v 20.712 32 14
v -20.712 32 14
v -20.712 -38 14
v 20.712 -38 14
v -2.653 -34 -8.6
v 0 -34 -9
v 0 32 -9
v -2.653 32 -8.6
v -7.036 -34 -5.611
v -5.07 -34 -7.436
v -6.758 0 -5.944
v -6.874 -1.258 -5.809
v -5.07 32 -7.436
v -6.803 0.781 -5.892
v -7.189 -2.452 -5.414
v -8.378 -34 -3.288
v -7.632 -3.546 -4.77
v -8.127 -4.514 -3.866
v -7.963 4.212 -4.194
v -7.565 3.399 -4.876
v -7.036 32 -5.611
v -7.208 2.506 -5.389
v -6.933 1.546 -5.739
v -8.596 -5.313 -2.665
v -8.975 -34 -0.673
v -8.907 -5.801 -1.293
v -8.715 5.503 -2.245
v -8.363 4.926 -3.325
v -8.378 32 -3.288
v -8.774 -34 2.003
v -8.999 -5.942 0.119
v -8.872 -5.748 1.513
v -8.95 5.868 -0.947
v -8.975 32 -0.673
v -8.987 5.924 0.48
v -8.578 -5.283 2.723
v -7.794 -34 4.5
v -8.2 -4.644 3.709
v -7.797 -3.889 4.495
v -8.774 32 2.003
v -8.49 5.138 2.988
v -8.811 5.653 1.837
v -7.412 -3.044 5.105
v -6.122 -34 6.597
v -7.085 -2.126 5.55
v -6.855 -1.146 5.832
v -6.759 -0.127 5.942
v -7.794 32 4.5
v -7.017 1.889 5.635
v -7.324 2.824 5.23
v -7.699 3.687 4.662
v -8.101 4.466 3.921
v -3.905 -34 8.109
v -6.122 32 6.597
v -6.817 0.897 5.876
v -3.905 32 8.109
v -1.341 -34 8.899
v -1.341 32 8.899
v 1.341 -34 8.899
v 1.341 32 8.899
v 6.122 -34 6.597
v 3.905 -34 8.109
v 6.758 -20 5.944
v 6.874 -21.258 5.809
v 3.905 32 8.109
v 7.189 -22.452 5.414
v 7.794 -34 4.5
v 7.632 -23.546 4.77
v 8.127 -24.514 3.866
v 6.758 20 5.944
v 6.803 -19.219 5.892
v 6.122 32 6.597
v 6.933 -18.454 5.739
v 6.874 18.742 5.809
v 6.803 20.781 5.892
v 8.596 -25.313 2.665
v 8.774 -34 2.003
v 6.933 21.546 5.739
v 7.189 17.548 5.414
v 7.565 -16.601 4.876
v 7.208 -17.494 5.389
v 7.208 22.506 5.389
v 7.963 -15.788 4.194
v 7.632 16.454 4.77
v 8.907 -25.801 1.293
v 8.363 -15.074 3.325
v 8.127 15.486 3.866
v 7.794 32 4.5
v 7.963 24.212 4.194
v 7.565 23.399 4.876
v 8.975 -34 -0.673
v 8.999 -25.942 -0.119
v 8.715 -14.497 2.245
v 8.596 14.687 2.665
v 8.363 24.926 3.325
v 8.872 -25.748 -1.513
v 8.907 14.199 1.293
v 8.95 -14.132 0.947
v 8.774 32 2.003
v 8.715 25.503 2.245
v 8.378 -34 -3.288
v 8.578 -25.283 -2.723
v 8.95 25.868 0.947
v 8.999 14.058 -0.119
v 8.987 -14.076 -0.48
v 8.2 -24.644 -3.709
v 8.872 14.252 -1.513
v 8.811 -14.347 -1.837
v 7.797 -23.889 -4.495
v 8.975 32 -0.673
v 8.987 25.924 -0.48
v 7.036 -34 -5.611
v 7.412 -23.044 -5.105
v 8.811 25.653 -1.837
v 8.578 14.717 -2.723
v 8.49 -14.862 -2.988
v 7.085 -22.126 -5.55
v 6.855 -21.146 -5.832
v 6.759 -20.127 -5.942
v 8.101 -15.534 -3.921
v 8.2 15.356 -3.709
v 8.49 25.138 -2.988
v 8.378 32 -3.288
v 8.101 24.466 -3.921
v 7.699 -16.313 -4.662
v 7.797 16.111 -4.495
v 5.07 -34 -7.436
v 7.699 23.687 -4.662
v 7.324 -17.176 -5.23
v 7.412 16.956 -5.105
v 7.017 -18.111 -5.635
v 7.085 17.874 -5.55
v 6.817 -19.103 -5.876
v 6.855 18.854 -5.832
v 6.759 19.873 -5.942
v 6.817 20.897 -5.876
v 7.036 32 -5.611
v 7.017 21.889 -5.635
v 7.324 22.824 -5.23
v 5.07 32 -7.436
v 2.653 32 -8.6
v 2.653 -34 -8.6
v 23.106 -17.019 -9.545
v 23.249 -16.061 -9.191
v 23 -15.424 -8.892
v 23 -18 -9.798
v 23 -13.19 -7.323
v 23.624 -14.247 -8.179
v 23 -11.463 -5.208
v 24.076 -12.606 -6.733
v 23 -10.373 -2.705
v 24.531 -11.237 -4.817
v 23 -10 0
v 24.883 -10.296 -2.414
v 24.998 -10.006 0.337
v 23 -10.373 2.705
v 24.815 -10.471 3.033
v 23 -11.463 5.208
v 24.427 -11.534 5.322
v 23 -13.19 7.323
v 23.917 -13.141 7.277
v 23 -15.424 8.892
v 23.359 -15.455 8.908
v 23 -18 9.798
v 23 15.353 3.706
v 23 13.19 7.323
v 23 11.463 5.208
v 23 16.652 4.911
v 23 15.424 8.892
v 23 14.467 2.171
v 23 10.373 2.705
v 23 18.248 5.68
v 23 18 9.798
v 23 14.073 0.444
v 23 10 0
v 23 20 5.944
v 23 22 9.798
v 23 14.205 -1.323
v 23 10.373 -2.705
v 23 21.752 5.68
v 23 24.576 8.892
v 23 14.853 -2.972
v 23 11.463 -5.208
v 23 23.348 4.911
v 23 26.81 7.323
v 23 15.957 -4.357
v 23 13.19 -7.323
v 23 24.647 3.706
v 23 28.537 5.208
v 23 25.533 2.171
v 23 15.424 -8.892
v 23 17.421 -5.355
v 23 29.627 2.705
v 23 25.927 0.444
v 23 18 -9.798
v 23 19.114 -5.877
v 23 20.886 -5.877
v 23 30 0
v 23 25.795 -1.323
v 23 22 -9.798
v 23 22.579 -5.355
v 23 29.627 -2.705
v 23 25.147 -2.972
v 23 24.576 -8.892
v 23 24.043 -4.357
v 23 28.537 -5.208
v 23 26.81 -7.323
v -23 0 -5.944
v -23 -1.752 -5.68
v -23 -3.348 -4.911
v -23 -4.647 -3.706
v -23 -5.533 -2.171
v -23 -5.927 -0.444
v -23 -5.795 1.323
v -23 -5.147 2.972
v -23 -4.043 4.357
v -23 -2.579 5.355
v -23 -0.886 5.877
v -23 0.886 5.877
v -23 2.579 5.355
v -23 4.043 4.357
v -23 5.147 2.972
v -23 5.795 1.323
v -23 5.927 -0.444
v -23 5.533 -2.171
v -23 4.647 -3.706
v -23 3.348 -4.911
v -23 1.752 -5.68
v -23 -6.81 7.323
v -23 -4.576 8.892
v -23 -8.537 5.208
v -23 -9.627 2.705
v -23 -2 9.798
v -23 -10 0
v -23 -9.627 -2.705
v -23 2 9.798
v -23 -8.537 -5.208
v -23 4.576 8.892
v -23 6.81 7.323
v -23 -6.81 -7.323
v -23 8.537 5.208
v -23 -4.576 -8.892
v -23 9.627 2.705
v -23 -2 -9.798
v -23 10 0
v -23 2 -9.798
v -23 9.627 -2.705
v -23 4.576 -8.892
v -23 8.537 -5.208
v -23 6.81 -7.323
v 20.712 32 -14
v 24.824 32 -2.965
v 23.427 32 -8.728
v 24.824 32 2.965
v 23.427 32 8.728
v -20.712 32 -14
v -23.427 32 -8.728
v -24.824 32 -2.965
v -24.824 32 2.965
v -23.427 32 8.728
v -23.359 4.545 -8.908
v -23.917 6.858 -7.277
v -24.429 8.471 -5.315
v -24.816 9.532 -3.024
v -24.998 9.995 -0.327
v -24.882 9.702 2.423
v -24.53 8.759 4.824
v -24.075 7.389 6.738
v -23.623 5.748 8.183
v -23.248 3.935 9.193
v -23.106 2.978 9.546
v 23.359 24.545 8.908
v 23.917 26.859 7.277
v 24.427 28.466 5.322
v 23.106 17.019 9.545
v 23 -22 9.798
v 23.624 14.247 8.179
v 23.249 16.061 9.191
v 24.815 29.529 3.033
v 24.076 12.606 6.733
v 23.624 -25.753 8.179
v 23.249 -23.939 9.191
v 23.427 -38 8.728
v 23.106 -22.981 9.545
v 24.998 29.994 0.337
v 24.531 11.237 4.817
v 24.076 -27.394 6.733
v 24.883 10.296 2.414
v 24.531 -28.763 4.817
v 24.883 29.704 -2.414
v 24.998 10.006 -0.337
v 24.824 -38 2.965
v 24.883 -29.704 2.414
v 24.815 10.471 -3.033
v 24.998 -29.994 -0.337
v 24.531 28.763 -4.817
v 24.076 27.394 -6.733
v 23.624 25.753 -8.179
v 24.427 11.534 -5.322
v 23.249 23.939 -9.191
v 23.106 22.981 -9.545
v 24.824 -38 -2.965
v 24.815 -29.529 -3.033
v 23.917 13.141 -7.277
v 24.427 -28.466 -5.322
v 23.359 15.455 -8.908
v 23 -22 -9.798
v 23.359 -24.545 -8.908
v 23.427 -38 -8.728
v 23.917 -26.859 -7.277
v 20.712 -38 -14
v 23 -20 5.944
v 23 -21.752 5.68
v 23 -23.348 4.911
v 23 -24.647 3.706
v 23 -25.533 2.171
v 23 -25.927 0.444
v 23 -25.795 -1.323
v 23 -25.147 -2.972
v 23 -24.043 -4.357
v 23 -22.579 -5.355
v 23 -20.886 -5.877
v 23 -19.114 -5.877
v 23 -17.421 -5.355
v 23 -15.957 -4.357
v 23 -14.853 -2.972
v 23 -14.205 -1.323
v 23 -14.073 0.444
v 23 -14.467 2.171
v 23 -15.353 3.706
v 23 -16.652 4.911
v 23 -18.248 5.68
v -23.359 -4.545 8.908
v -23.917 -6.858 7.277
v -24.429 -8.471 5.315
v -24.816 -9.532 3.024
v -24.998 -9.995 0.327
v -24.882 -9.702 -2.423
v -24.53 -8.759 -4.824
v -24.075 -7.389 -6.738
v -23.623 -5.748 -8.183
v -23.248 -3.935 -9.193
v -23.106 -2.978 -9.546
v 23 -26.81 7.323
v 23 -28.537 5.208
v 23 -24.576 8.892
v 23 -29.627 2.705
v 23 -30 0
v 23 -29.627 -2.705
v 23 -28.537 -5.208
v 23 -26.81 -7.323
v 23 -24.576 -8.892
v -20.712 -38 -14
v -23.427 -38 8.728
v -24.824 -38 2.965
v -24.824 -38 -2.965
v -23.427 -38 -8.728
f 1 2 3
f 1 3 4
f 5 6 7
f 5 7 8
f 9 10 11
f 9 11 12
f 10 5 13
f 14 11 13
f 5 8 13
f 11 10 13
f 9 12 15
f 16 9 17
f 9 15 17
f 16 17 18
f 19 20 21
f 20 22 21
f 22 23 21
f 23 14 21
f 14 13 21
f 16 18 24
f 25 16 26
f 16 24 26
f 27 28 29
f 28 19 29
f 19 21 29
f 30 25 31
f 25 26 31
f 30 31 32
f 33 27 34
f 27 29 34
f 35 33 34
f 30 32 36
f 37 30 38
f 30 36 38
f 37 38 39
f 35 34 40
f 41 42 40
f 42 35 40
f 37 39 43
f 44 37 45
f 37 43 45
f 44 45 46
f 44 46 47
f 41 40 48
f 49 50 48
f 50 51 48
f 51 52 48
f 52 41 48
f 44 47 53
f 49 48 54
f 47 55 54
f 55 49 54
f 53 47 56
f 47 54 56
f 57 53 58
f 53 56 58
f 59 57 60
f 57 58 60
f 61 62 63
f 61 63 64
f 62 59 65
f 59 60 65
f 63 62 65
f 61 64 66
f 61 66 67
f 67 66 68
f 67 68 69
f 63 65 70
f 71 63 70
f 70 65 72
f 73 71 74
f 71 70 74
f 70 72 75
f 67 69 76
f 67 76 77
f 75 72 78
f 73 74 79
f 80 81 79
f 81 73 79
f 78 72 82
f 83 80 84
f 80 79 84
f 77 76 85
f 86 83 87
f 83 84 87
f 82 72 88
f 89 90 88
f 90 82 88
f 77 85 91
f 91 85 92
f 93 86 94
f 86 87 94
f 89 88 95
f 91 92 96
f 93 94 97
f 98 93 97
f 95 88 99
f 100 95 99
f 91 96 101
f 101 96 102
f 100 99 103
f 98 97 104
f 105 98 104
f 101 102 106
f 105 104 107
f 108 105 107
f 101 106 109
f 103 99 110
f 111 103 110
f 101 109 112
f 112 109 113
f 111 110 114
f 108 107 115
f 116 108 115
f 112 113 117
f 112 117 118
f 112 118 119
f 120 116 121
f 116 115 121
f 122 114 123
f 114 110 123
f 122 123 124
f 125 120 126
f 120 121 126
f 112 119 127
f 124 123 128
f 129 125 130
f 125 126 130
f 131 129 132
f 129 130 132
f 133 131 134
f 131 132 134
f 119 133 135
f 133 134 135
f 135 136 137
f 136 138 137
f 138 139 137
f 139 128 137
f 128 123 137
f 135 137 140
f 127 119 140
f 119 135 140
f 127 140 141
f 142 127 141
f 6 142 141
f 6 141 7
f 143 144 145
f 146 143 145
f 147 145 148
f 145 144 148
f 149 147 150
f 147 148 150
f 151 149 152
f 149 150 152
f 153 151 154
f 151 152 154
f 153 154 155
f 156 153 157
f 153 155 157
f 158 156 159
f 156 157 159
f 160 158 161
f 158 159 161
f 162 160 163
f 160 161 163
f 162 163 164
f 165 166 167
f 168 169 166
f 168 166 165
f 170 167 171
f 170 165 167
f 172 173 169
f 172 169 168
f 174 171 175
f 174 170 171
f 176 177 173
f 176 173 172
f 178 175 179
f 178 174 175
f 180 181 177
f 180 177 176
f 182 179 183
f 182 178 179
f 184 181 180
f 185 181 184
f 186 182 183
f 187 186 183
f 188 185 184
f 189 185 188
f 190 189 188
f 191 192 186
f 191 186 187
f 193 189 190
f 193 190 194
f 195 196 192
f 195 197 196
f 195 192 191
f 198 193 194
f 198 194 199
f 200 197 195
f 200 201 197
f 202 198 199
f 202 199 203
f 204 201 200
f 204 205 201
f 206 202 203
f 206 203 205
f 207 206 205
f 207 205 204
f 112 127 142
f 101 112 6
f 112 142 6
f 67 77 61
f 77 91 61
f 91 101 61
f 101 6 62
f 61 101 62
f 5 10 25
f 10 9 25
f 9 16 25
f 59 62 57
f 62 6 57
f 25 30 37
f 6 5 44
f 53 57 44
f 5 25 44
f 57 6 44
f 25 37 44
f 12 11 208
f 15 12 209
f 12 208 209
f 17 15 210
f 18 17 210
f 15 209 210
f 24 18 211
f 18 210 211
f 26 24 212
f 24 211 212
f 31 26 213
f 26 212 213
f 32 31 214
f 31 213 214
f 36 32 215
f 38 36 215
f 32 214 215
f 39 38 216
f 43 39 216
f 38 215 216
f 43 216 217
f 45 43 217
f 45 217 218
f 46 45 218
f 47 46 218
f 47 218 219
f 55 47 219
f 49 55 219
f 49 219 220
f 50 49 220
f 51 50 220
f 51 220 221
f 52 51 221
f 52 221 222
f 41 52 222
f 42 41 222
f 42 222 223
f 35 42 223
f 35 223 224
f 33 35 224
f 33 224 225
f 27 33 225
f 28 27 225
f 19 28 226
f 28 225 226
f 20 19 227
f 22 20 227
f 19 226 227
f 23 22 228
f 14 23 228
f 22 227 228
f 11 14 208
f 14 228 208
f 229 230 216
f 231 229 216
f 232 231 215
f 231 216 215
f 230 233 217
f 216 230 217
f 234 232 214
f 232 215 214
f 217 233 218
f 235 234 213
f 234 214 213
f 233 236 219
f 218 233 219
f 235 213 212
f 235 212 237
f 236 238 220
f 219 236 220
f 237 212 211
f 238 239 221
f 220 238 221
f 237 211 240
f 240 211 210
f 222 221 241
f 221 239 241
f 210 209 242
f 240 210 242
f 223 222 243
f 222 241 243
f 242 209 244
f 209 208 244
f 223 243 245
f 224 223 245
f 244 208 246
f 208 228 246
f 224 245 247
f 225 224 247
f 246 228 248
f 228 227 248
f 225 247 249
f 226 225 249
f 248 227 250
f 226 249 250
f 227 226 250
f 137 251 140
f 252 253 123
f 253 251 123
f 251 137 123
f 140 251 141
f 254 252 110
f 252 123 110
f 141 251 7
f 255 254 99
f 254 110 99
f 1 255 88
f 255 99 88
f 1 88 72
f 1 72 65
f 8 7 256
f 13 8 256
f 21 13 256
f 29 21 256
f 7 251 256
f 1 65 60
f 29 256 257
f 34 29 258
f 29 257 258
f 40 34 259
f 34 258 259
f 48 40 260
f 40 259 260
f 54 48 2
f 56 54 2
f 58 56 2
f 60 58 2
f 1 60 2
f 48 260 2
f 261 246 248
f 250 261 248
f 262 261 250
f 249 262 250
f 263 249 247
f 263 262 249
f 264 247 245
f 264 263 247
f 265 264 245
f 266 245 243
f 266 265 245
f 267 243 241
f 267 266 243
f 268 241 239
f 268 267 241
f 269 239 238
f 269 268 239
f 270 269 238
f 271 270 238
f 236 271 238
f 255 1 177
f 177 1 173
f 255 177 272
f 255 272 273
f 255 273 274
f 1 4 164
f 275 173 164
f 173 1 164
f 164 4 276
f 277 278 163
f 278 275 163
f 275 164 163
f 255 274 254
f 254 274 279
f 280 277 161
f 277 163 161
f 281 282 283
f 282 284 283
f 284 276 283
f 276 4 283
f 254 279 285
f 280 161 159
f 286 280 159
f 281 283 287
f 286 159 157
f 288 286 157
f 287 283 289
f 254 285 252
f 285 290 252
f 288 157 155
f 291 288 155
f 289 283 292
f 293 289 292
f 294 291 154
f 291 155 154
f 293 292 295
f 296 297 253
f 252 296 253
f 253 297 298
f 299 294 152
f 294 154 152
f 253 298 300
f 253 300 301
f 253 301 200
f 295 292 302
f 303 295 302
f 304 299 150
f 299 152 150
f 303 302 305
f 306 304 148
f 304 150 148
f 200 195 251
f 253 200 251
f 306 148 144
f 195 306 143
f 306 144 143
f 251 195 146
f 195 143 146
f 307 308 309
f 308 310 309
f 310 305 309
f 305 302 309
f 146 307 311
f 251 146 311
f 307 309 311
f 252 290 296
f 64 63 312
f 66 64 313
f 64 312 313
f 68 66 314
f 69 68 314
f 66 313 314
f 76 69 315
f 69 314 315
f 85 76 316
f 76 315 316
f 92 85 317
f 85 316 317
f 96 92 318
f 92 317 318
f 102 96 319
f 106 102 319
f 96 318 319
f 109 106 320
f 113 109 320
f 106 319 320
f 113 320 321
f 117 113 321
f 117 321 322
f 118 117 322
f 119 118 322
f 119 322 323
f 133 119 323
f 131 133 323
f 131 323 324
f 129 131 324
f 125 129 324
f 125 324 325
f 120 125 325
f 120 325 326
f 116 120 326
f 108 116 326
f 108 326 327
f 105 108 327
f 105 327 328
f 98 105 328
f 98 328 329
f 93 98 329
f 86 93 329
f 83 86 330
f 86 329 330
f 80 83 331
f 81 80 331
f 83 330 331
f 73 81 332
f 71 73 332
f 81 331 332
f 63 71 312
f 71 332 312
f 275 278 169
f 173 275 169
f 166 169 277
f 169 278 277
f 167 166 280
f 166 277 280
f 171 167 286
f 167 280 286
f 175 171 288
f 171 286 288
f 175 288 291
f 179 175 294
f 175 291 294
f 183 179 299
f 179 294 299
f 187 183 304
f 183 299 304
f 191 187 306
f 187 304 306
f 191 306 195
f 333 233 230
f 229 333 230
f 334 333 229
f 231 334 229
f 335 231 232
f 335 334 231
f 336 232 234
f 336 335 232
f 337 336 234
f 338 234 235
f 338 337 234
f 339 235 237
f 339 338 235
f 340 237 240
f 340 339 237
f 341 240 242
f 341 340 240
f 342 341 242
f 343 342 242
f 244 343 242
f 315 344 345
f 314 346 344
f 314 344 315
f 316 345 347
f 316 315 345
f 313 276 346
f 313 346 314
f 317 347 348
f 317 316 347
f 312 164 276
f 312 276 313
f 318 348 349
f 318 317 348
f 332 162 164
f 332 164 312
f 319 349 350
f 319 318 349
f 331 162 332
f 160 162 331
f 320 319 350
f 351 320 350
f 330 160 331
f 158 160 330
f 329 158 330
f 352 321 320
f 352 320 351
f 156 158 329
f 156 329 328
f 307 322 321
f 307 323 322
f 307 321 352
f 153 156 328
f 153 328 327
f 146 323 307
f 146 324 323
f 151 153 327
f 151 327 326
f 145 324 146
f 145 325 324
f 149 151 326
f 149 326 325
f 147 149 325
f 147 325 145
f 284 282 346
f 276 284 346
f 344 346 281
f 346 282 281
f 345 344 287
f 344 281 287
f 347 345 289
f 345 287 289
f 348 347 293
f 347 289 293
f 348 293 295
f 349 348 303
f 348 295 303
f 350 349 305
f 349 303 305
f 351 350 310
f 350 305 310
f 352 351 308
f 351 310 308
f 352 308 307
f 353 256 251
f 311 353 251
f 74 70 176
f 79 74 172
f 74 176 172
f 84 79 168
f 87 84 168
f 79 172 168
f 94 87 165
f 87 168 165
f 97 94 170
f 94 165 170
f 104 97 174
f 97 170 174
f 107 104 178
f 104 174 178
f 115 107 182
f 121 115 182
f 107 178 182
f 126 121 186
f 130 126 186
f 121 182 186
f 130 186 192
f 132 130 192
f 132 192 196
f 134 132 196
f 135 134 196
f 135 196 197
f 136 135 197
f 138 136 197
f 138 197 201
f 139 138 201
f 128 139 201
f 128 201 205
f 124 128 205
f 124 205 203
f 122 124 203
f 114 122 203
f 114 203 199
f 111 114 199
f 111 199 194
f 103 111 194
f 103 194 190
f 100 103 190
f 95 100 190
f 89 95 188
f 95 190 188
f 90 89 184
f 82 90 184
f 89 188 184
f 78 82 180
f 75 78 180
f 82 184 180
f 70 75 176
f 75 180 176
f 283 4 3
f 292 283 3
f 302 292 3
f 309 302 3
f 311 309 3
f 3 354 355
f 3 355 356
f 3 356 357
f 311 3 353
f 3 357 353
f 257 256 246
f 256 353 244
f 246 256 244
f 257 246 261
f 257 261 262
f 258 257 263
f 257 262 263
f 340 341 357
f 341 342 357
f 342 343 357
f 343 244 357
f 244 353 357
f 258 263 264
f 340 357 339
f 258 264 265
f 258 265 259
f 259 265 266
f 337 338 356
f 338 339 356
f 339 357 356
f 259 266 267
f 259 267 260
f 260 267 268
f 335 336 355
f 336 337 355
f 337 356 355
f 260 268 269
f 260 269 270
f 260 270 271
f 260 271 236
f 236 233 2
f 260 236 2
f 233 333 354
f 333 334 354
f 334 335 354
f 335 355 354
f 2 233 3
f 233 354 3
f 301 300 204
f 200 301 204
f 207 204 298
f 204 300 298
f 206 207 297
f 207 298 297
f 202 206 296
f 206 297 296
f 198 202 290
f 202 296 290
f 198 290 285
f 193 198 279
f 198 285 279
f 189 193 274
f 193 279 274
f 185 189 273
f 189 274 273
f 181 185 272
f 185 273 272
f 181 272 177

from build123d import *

# Parameters (mm, degrees)
FURO_ROSCADO_DE_1_4_18_NPSM1_REACH  = 69.594
FURO_ROSCADO_DE_1_4_18_NPSM1_BORE_R = 5.9436
FURO_ROSCADO_DE_1_4_18_NPSM2_REACH  = 82.554
FURO_ROSCADO_DE_1_4_18_NPSM2_BORE_R = 5.9436
ESBO_O4_R                           = 10
CORTE_EXTRUS_O1_DEPTH               = 2
ESBO_O6_R                           = 10
CORTE_EXTRUS_O2_DEPTH               = 2
CORTE_EXTRUS_O3_DEPTH               = 79.42193586


with BuildPart() as part:
    # Esboço1 → Revolução1 (revolve)
    with BuildSketch(Plane.XY, mode=Mode.PRIVATE) as revolu_o1_sk:
        Polygon((9, 32), (25, 32), (25, -38), (0, -38), (0, -34), (9, -34), align=None)
    revolve(revolu_o1_sk.sketch.rotate(Axis((0, 0, 0), (0, 1, 0)), 90), axis=Axis((0, 0, 0), (0, 1, 0)))

    # Furo roscado de 1/4-18 NPSM1 bore (on position points) → Furo roscado de 1/4-18 NPSM1 (cut, up to next)
    with BuildSketch(Plane(origin=(-25, 0, 0), x_dir=(0, 0, -1), z_dir=(-1, 0, 0)), mode=Mode.PRIVATE) as furo_roscado_de_1_4_18_npsm1_sk1:
        Circle(FURO_ROSCADO_DE_1_4_18_NPSM1_BORE_R)
    furo_roscado_de_1_4_18_npsm1_tool1 = extrude(furo_roscado_de_1_4_18_npsm1_sk1.sketch, amount=-FURO_ROSCADO_DE_1_4_18_NPSM1_REACH, mode=Mode.PRIVATE) & part.part
    add(furo_roscado_de_1_4_18_npsm1_tool1.solids().sort_by_distance((-25, 0, 0))[0], mode=Mode.SUBTRACT)

    # Furo roscado de 1/4-18 NPSM2 bore (on position points) → Furo roscado de 1/4-18 NPSM2 (cut, up to next)
    with BuildSketch(Plane(origin=(25, 20, 0), x_dir=(0, 0, 1), z_dir=(1, 0, 0)), mode=Mode.PRIVATE) as furo_roscado_de_1_4_18_npsm2_sk1:
        Circle(FURO_ROSCADO_DE_1_4_18_NPSM2_BORE_R)
    furo_roscado_de_1_4_18_npsm2_tool1 = extrude(furo_roscado_de_1_4_18_npsm2_sk1.sketch, amount=-FURO_ROSCADO_DE_1_4_18_NPSM2_REACH, mode=Mode.PRIVATE) & part.part
    # Furo roscado de 1/4-18 NPSM2 bore (on position points) → Furo roscado de 1/4-18 NPSM2 (cut, up to next)
    with BuildSketch(Plane(origin=(25, 20, 0), x_dir=(0, 0, 1), z_dir=(1, 0, 0)), mode=Mode.PRIVATE) as furo_roscado_de_1_4_18_npsm2_sk2:
        with Locations((0, 40)):
            Circle(FURO_ROSCADO_DE_1_4_18_NPSM2_BORE_R)
    furo_roscado_de_1_4_18_npsm2_tool2 = extrude(furo_roscado_de_1_4_18_npsm2_sk2.sketch, amount=-FURO_ROSCADO_DE_1_4_18_NPSM2_REACH, mode=Mode.PRIVATE) & part.part
    add(furo_roscado_de_1_4_18_npsm2_tool1.solids().sort_by_distance((25, 20, 0))[0], mode=Mode.SUBTRACT)
    add(furo_roscado_de_1_4_18_npsm2_tool2.solids().sort_by_distance((25, -20, 0))[0], mode=Mode.SUBTRACT)

    # Esboço4 → Corte-extrusão1 (cut)
    with BuildSketch(Plane(origin=(-25, 0, 0), x_dir=(0, 0, -1), z_dir=(1, 0, 0))):
        Circle(ESBO_O4_R)
    extrude(amount=CORTE_EXTRUS_O1_DEPTH, mode=Mode.SUBTRACT)

    # Esboço6 → Corte-extrusão2 (cut)
    with BuildSketch(Plane(origin=(25, 0, 0), x_dir=(0, 0, -1), z_dir=(1, 0, 0))):
        with Locations((0, 20)):
            Circle(ESBO_O6_R)
        with Locations((0, -20)):
            Circle(ESBO_O6_R)
    extrude(amount=-CORTE_EXTRUS_O2_DEPTH, mode=Mode.SUBTRACT)

    # Esboço7 → Corte-extrusão3 (cut, through all)
    with BuildSketch(Plane(origin=(0, 32, 0), x_dir=(1, 0, 0), z_dir=(0, 1, 0))):
        with BuildLine():
            Line((-20.712315177, 14), (20.712315177, 14))
            ThreePointArc((20.712315177, 14), (0, 25), (-20.712315177, 14))
        make_face()
        with BuildLine():
            Line((-20.712315177, -14), (20.712315177, -14))
            ThreePointArc((20.712315177, -14), (0, -25), (-20.712315177, -14))
        make_face()
    extrude(amount=-CORTE_EXTRUS_O3_DEPTH, mode=Mode.SUBTRACT)


solid = part.part
